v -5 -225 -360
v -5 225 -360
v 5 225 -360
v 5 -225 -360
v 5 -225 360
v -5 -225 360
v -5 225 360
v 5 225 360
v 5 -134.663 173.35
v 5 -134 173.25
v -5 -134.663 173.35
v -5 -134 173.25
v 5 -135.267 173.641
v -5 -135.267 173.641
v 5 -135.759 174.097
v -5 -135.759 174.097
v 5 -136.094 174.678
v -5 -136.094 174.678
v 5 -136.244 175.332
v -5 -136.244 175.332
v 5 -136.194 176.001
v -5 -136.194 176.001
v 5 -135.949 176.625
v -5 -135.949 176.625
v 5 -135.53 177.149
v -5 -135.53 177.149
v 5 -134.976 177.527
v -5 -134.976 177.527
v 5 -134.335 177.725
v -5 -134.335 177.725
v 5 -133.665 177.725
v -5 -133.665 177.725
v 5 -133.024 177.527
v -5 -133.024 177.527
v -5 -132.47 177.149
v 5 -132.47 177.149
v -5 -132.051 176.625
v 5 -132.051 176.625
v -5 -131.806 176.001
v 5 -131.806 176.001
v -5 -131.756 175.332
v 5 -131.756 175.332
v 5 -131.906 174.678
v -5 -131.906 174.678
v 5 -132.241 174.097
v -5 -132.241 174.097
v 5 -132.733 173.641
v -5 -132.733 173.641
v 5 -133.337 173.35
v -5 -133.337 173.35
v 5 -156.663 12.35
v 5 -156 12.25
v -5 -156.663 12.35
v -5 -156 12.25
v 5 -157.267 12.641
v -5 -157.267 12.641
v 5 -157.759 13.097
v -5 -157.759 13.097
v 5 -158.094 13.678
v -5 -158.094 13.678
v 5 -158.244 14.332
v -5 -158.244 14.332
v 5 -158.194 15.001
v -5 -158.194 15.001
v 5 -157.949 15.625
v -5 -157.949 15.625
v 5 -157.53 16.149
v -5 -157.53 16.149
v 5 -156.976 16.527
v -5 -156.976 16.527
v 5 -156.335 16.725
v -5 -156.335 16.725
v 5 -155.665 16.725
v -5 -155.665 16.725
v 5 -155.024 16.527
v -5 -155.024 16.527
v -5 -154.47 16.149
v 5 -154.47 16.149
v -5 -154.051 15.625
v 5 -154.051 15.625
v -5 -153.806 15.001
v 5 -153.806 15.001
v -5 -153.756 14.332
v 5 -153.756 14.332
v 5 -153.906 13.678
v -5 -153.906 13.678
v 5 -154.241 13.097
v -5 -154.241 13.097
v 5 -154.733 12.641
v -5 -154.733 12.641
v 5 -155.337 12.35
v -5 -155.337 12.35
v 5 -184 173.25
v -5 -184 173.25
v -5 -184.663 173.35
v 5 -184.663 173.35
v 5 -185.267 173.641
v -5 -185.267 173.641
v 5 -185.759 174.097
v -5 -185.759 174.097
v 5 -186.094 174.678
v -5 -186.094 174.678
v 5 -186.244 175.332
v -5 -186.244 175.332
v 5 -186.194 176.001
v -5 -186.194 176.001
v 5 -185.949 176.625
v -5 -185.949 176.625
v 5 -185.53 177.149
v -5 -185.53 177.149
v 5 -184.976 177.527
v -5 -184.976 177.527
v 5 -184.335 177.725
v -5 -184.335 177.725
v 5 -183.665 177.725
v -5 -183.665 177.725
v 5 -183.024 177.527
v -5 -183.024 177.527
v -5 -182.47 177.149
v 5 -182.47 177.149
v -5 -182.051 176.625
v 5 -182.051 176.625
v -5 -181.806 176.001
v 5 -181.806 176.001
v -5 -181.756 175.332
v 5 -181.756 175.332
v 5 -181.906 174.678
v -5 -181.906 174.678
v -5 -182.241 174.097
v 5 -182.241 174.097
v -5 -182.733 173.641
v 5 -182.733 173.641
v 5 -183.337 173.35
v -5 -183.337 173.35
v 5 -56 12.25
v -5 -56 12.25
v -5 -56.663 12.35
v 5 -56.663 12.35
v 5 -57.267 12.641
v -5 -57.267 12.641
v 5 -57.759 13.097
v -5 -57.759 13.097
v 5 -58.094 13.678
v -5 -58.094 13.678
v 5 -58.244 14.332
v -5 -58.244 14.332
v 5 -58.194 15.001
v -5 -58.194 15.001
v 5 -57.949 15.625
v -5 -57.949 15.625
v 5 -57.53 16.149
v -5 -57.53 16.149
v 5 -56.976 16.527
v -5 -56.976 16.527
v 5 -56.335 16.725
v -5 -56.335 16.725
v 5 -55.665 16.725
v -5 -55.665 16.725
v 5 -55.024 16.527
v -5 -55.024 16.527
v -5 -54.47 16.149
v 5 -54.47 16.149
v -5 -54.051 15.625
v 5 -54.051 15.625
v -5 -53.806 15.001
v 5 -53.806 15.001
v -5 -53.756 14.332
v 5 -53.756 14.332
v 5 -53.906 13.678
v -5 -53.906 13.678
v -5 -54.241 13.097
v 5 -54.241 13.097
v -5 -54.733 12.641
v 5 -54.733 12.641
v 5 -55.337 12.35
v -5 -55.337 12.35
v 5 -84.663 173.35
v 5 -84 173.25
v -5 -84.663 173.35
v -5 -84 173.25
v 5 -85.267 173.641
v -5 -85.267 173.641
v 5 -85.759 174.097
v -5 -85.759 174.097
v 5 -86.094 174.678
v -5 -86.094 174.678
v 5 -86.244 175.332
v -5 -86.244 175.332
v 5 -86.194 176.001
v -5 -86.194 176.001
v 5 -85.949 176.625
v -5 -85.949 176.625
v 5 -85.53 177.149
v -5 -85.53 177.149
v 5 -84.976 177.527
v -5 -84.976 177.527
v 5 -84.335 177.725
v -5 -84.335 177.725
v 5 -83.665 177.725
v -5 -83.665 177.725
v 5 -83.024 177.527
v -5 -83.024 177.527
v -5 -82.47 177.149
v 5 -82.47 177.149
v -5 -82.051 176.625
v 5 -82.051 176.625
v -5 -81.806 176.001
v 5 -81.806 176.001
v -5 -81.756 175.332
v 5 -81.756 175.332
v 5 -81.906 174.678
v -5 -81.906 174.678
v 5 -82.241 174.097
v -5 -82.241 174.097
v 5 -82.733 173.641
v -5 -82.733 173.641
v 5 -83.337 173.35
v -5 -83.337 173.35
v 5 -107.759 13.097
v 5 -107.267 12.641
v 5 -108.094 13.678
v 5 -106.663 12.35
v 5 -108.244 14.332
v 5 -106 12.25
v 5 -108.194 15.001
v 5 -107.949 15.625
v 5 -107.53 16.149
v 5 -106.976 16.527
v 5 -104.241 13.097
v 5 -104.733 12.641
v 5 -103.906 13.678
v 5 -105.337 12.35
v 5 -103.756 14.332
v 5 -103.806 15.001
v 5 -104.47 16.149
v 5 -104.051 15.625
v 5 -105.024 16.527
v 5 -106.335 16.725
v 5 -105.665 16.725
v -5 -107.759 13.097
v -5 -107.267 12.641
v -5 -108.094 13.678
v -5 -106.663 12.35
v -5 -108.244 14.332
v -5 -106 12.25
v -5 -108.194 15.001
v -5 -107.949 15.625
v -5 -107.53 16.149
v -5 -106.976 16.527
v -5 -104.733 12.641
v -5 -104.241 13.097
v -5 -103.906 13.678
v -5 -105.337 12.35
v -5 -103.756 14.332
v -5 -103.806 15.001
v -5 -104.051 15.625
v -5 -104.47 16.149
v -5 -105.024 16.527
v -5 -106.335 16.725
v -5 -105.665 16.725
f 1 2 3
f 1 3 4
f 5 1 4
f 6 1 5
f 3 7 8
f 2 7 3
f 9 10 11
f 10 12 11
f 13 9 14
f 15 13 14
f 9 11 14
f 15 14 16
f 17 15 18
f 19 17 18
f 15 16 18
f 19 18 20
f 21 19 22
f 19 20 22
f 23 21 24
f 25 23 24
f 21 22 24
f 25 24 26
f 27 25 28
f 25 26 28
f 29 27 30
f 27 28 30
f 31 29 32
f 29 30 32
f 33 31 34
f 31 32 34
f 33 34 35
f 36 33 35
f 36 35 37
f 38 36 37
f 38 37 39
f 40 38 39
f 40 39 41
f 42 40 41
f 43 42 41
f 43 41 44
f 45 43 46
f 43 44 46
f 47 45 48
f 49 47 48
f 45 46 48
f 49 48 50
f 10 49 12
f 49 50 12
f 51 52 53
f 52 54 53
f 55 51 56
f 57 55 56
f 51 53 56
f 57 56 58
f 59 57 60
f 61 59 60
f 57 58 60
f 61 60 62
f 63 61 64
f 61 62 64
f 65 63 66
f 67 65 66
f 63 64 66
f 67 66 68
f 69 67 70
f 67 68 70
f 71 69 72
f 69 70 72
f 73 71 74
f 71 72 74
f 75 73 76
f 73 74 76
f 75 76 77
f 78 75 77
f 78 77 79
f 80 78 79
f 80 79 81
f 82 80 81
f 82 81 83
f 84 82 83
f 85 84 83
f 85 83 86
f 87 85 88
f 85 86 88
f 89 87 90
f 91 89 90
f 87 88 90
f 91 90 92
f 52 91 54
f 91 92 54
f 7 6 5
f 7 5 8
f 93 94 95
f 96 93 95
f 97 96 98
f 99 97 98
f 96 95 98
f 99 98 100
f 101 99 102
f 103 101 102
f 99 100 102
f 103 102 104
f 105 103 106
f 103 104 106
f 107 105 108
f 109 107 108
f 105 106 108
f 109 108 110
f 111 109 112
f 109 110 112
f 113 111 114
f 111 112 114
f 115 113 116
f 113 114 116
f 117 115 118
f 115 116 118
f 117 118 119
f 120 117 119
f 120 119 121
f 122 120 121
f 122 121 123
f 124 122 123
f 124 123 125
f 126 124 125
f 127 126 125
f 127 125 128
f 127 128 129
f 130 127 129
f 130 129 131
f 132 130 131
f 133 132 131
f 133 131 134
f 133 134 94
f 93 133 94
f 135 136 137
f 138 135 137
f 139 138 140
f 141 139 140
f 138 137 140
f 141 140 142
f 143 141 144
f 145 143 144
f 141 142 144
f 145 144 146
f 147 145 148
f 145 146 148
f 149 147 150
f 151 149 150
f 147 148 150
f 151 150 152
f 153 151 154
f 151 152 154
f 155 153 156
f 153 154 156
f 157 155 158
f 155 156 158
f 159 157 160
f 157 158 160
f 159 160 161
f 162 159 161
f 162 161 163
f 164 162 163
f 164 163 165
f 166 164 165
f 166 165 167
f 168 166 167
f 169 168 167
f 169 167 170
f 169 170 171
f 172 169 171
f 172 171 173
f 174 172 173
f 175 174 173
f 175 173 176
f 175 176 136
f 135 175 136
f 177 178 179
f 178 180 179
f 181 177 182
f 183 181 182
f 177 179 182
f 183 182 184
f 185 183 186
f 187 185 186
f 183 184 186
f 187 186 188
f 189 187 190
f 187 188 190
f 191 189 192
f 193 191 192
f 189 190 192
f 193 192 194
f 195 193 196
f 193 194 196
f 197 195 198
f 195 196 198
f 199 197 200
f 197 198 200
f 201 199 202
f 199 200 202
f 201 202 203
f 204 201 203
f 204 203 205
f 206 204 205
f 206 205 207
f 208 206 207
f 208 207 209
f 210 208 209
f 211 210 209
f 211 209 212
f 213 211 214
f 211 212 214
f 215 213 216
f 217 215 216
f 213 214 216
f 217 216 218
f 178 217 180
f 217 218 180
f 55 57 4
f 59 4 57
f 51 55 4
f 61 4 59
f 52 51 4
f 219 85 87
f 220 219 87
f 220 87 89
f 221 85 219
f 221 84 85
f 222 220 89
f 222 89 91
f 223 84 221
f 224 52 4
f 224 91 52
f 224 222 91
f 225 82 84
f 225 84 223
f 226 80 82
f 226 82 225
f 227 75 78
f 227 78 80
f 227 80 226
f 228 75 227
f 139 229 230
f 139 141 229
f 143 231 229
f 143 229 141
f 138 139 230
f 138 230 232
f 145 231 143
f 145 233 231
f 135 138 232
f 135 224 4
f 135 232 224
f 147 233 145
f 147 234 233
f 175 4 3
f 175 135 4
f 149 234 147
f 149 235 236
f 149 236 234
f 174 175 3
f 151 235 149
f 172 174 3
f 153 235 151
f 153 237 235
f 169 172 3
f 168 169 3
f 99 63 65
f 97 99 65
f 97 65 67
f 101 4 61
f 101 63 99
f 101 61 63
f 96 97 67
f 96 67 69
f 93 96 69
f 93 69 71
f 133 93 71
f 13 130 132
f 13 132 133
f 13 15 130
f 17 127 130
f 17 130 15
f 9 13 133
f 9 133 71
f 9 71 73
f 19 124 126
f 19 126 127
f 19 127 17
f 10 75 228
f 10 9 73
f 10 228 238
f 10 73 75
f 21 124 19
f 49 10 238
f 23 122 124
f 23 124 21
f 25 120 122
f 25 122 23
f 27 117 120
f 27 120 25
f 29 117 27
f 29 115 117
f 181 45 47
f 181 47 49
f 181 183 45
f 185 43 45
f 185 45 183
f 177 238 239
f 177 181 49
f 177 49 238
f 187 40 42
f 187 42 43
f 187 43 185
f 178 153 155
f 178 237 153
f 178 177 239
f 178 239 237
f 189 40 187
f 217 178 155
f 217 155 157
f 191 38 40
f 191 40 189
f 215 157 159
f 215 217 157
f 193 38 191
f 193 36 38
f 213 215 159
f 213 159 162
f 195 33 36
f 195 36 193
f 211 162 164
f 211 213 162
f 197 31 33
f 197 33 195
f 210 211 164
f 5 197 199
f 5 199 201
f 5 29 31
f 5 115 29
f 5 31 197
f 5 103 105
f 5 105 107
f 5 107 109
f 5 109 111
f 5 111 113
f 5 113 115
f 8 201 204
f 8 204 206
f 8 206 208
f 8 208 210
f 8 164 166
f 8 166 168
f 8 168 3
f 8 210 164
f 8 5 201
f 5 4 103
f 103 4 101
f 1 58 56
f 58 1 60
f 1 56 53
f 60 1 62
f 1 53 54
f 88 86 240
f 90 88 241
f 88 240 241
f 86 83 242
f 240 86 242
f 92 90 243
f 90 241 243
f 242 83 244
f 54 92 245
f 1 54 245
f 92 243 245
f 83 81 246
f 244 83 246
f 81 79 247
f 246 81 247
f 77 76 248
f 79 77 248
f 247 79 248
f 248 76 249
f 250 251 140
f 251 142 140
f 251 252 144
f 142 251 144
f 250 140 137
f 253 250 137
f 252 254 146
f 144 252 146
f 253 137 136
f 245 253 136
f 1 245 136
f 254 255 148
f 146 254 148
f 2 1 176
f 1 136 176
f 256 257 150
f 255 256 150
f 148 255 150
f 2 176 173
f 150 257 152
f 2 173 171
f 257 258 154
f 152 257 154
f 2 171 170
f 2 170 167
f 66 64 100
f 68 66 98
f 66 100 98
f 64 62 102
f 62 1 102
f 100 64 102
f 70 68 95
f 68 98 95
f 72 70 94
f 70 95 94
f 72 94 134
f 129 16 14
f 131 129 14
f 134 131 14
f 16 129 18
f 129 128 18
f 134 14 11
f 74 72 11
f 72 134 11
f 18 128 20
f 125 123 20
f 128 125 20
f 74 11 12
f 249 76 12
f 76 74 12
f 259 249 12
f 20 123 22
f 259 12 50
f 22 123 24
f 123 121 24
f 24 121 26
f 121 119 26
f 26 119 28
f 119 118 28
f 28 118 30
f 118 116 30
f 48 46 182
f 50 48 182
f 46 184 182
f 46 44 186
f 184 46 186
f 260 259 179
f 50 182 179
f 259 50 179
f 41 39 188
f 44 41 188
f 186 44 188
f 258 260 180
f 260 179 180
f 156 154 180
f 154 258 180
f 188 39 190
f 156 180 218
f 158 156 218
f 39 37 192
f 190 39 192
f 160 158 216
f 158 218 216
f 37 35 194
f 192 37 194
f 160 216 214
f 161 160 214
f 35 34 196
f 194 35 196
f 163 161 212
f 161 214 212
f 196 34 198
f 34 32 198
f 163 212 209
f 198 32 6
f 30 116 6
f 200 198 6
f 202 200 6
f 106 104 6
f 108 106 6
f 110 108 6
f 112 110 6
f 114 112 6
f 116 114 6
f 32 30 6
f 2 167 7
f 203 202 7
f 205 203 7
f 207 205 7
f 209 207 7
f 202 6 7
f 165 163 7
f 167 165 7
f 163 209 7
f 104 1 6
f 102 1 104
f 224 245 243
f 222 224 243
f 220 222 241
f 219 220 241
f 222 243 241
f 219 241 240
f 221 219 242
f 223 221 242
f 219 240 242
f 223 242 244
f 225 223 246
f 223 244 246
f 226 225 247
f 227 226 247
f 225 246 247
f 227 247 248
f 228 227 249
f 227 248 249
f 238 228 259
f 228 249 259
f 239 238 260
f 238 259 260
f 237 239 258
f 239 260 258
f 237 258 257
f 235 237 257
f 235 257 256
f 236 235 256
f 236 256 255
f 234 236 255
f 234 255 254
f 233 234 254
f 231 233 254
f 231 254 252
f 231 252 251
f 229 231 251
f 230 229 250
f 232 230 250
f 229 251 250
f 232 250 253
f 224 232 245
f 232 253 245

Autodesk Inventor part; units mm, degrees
ref_plane "YZ Plane" through (0, 0, 0) normal (1, 0, 0) x (0, 1, 0)
ref_plane "XZ Plane" through (0, 0, 0) normal (0, 1, 0) x (-1, 0, 0)
ref_plane "XY Plane" through (0, 0, 0) normal (0, 0, 1) x (1, 0, 0)
sketch "Sketch2" plane through (0, 0, 0) normal (1, 0, 0) x (0, 1, 0)
  line L0 (-225, 360) -> (225, 360)
  line L1 (225, 360) -> (225, -360)
  line L2 (225, -360) -> (-225, -360)
  line L3 (-225, -360) -> (-225, 360)
  line L4 (-225, 360) -> (225, -360) construction
  line L5 (225, 360) -> (-225, -360) construction
  point P0 (0, 0)
  dimension "d0" = 450
  dimension "d1" = 720
extrude "Extrusion1" add sketch "Sketch2" along normal mid plane 10
sketch "Sketch3" plane through (5, 0, 0) normal (1, 0, 0) x (0, 0, -1)
  line L0 (360, -225) -> (360, 225) projected
  line L1 (360, 225) -> (-360, 225) projected
  line L2 (-360, 225) -> (-360, -225) projected
  line L3 (-360, -225) -> (360, -225) projected
  line L4 (-335, -200) -> (-335, 200)
  line L5 (-335, 200) -> (335, 200)
  line L6 (335, 200) -> (335, -200)
  line L7 (335, -200) -> (-335, -200)
  line L8 (-175.5, -184) -> (-175.5, -134) construction
  line L9 (-175.5, -134) -> (-175.5, -84) construction
  line L10 (-175.5, -184) -> (-14.5, -156) construction
  line L11 (-175.5, -134) -> (-14.5, -106) construction
  line L12 (-175.5, -84) -> (-14.5, -56) construction
  line L13 (-180, -190) -> (-10, -190)
  line L14 (-10, -190) -> (-10, -150)
  line L15 (-10, -150) -> (-180, -150)
  line L16 (-180, -150) -> (-180, -190)
  line L17 (-180, -190) -> (-10, -150) construction
  line L18 (-10, -190) -> (-180, -150) construction
  line L19 (-180, -140) -> (-10, -140)
  line L20 (-10, -140) -> (-10, -100)
  line L21 (-10, -100) -> (-180, -100)
  line L22 (-180, -100) -> (-180, -140)
  line L23 (-180, -140) -> (-10, -100) construction
  line L24 (-10, -140) -> (-180, -100) construction
  line L25 (-180, -90) -> (-10, -90)
  line L26 (-10, -90) -> (-10, -50)
  line L27 (-10, -50) -> (-180, -50)
  line L28 (-180, -50) -> (-180, -90)
  line L29 (-180, -90) -> (-10, -50) construction
  line L30 (-10, -90) -> (-180, -50) construction
  point P0 (0, 0)
  point P1 (-95, -170)
  point P2 (-95, -120)
  point P3 (-95, -70)
  dimension "d4" = 25
  dimension "d5" = 28
  dimension "d6" = 161
  dimension "d7" = 161
  dimension "d8" = 28
  dimension "d9" = 28
  dimension "d10" = 161
  dimension "d11" = 50
  dimension "d12" = 50
  dimension "d13" = 170
  dimension "d14" = 40
  dimension "d15" = 170
  dimension "d16" = 40
  dimension "d17" = 170
  dimension "d18" = 40
  dimension "d21" = 10
  dimension "d29" = 155
hole "Hole1" at (5, -84, 175.5) at (5, -56, 14.5) at (5, -134, 175.5) at (5, -106, 14.5) at (5, -184, 175.5) at (5, -156, 14.5) direction (-1, 0, 0) diameter 4.5 end through all clearance for "Flat Head Machine Screw" size "M4" standard "Ansi Metric M Profile"
properties part number "RT_ELE_MC_017_MainBackPlate" material "UHMW, Black"
